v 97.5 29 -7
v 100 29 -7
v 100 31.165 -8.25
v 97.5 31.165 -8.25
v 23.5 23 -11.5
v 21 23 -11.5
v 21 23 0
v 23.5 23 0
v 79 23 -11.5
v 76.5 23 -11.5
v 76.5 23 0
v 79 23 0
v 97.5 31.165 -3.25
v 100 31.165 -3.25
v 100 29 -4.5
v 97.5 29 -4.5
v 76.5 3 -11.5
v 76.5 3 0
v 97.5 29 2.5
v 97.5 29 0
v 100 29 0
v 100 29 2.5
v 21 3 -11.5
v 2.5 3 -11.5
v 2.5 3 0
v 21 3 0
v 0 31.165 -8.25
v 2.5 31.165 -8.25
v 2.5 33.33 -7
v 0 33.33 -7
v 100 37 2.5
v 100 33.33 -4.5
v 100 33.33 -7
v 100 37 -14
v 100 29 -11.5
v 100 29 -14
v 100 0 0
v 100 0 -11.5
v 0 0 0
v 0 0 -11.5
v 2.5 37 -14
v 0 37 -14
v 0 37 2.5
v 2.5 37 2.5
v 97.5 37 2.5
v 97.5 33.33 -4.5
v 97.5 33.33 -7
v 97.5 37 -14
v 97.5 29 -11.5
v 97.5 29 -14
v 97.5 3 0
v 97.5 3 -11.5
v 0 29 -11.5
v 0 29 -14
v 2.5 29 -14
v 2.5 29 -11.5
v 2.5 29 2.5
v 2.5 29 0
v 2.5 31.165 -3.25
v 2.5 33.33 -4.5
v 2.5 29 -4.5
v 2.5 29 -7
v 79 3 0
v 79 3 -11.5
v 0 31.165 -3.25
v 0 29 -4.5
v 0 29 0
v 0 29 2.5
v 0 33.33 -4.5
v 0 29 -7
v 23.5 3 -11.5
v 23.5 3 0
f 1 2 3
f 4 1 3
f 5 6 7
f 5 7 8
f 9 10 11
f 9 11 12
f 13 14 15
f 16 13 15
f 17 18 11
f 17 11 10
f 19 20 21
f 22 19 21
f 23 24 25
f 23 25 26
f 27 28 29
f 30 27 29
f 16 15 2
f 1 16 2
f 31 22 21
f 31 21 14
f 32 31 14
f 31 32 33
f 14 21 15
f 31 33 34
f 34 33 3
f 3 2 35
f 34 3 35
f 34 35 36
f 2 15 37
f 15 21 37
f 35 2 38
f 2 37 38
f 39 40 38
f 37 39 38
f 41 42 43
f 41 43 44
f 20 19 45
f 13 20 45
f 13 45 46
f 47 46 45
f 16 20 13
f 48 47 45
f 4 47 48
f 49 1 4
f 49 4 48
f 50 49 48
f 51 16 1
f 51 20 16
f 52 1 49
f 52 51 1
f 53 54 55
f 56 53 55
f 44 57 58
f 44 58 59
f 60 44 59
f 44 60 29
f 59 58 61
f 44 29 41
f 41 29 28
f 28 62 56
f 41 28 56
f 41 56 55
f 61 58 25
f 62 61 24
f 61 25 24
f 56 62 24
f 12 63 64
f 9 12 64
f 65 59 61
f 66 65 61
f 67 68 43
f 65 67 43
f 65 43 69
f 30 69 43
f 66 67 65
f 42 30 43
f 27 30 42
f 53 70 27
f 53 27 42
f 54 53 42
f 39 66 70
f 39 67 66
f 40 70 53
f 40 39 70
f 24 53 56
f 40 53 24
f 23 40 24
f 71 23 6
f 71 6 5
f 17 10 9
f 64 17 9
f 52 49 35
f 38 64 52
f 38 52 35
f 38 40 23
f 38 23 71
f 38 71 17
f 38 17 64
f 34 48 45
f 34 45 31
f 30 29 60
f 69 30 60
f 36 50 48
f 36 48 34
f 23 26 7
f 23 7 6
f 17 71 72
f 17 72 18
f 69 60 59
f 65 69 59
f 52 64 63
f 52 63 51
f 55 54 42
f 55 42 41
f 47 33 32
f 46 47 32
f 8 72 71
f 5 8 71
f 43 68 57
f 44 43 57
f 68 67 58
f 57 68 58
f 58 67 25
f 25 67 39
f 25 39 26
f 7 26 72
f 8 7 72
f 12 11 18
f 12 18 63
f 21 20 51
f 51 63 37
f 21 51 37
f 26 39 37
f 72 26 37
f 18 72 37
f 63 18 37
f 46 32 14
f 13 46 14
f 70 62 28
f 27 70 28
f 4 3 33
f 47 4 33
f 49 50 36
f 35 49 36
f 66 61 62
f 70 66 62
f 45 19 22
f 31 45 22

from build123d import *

# Parameters (mm, degrees)
SKETCH_1_W          = 100
SKETCH_1_H          = 11.5
EXTRUDE_1_DEPTH     = 3
SKETCH_2_W          = 2.5
SKETCH_2_H          = 11.5
EXTRUDE_2_DEPTH     = 26
SKETCH_3_W          = 2.5
SKETCH_3_H          = 11.5
EXTRUDE_3_DEPTH     = 20
SKETCH_6_W          = 2.5
SKETCH_6_H          = 16.5
EXTRUDE_4_DEPTH     = 8
CUT_EXTRUDE_1_DEPTH = 101


with BuildPart() as part:
    # 草图1 → 凸台-拉伸1 (new body)
    with BuildSketch(Plane(origin=(0, 0, 0), x_dir=(1, 0, 0), z_dir=(0, 1, 0))):
        with Locations((50, 5.75)):
            Rectangle(SKETCH_1_W, SKETCH_1_H)
    extrude(amount=EXTRUDE_1_DEPTH)

    # 草图2 → 凸台-拉伸2 (add)
    with BuildSketch(Plane(origin=(0, 3, 0), x_dir=(1, 0, 0), z_dir=(0, 1, 0))):
        with Locations((1.25, 5.75)):
            Rectangle(SKETCH_2_W, SKETCH_2_H)
        with Locations((98.75, 5.75)):
            Rectangle(SKETCH_2_W, SKETCH_2_H)
    extrude(amount=EXTRUDE_2_DEPTH)

    # 草图3 → 凸台-拉伸3 (add)
    with BuildSketch(Plane(origin=(0, 3, 0), x_dir=(1, 0, 0), z_dir=(0, 1, 0))):
        with Locations((22.25, 5.75)):
            Rectangle(SKETCH_3_W, SKETCH_3_H)
        with Locations((77.75, 5.75)):
            Rectangle(SKETCH_3_W, SKETCH_3_H)
    extrude(amount=EXTRUDE_3_DEPTH)

    # 草图6 → 凸台-拉伸4 (add)
    with BuildSketch(Plane(origin=(0, 29, 0), x_dir=(1, 0, 0), z_dir=(0, 1, 0))):
        with Locations((1.25, 5.75)):
            Rectangle(SKETCH_6_W, SKETCH_6_H)
        with Locations((98.75, 5.75)):
            Rectangle(SKETCH_6_W, SKETCH_6_H)
    extrude(amount=EXTRUDE_4_DEPTH)

    # 草图5 → 切除-拉伸1 (cut, through all)
    with BuildSketch(Plane(origin=(100, 0, 0), x_dir=(0, 0, -1), z_dir=(1, 0, 0))):
        Polygon((8.25, 31.165063509), (7, 33.330127019), (4.5, 33.330127019), (3.25, 31.165063509), (4.5, 29), (7, 29), align=None)
    extrude(amount=-CUT_EXTRUDE_1_DEPTH, mode=Mode.SUBTRACT)


solid = part.part
